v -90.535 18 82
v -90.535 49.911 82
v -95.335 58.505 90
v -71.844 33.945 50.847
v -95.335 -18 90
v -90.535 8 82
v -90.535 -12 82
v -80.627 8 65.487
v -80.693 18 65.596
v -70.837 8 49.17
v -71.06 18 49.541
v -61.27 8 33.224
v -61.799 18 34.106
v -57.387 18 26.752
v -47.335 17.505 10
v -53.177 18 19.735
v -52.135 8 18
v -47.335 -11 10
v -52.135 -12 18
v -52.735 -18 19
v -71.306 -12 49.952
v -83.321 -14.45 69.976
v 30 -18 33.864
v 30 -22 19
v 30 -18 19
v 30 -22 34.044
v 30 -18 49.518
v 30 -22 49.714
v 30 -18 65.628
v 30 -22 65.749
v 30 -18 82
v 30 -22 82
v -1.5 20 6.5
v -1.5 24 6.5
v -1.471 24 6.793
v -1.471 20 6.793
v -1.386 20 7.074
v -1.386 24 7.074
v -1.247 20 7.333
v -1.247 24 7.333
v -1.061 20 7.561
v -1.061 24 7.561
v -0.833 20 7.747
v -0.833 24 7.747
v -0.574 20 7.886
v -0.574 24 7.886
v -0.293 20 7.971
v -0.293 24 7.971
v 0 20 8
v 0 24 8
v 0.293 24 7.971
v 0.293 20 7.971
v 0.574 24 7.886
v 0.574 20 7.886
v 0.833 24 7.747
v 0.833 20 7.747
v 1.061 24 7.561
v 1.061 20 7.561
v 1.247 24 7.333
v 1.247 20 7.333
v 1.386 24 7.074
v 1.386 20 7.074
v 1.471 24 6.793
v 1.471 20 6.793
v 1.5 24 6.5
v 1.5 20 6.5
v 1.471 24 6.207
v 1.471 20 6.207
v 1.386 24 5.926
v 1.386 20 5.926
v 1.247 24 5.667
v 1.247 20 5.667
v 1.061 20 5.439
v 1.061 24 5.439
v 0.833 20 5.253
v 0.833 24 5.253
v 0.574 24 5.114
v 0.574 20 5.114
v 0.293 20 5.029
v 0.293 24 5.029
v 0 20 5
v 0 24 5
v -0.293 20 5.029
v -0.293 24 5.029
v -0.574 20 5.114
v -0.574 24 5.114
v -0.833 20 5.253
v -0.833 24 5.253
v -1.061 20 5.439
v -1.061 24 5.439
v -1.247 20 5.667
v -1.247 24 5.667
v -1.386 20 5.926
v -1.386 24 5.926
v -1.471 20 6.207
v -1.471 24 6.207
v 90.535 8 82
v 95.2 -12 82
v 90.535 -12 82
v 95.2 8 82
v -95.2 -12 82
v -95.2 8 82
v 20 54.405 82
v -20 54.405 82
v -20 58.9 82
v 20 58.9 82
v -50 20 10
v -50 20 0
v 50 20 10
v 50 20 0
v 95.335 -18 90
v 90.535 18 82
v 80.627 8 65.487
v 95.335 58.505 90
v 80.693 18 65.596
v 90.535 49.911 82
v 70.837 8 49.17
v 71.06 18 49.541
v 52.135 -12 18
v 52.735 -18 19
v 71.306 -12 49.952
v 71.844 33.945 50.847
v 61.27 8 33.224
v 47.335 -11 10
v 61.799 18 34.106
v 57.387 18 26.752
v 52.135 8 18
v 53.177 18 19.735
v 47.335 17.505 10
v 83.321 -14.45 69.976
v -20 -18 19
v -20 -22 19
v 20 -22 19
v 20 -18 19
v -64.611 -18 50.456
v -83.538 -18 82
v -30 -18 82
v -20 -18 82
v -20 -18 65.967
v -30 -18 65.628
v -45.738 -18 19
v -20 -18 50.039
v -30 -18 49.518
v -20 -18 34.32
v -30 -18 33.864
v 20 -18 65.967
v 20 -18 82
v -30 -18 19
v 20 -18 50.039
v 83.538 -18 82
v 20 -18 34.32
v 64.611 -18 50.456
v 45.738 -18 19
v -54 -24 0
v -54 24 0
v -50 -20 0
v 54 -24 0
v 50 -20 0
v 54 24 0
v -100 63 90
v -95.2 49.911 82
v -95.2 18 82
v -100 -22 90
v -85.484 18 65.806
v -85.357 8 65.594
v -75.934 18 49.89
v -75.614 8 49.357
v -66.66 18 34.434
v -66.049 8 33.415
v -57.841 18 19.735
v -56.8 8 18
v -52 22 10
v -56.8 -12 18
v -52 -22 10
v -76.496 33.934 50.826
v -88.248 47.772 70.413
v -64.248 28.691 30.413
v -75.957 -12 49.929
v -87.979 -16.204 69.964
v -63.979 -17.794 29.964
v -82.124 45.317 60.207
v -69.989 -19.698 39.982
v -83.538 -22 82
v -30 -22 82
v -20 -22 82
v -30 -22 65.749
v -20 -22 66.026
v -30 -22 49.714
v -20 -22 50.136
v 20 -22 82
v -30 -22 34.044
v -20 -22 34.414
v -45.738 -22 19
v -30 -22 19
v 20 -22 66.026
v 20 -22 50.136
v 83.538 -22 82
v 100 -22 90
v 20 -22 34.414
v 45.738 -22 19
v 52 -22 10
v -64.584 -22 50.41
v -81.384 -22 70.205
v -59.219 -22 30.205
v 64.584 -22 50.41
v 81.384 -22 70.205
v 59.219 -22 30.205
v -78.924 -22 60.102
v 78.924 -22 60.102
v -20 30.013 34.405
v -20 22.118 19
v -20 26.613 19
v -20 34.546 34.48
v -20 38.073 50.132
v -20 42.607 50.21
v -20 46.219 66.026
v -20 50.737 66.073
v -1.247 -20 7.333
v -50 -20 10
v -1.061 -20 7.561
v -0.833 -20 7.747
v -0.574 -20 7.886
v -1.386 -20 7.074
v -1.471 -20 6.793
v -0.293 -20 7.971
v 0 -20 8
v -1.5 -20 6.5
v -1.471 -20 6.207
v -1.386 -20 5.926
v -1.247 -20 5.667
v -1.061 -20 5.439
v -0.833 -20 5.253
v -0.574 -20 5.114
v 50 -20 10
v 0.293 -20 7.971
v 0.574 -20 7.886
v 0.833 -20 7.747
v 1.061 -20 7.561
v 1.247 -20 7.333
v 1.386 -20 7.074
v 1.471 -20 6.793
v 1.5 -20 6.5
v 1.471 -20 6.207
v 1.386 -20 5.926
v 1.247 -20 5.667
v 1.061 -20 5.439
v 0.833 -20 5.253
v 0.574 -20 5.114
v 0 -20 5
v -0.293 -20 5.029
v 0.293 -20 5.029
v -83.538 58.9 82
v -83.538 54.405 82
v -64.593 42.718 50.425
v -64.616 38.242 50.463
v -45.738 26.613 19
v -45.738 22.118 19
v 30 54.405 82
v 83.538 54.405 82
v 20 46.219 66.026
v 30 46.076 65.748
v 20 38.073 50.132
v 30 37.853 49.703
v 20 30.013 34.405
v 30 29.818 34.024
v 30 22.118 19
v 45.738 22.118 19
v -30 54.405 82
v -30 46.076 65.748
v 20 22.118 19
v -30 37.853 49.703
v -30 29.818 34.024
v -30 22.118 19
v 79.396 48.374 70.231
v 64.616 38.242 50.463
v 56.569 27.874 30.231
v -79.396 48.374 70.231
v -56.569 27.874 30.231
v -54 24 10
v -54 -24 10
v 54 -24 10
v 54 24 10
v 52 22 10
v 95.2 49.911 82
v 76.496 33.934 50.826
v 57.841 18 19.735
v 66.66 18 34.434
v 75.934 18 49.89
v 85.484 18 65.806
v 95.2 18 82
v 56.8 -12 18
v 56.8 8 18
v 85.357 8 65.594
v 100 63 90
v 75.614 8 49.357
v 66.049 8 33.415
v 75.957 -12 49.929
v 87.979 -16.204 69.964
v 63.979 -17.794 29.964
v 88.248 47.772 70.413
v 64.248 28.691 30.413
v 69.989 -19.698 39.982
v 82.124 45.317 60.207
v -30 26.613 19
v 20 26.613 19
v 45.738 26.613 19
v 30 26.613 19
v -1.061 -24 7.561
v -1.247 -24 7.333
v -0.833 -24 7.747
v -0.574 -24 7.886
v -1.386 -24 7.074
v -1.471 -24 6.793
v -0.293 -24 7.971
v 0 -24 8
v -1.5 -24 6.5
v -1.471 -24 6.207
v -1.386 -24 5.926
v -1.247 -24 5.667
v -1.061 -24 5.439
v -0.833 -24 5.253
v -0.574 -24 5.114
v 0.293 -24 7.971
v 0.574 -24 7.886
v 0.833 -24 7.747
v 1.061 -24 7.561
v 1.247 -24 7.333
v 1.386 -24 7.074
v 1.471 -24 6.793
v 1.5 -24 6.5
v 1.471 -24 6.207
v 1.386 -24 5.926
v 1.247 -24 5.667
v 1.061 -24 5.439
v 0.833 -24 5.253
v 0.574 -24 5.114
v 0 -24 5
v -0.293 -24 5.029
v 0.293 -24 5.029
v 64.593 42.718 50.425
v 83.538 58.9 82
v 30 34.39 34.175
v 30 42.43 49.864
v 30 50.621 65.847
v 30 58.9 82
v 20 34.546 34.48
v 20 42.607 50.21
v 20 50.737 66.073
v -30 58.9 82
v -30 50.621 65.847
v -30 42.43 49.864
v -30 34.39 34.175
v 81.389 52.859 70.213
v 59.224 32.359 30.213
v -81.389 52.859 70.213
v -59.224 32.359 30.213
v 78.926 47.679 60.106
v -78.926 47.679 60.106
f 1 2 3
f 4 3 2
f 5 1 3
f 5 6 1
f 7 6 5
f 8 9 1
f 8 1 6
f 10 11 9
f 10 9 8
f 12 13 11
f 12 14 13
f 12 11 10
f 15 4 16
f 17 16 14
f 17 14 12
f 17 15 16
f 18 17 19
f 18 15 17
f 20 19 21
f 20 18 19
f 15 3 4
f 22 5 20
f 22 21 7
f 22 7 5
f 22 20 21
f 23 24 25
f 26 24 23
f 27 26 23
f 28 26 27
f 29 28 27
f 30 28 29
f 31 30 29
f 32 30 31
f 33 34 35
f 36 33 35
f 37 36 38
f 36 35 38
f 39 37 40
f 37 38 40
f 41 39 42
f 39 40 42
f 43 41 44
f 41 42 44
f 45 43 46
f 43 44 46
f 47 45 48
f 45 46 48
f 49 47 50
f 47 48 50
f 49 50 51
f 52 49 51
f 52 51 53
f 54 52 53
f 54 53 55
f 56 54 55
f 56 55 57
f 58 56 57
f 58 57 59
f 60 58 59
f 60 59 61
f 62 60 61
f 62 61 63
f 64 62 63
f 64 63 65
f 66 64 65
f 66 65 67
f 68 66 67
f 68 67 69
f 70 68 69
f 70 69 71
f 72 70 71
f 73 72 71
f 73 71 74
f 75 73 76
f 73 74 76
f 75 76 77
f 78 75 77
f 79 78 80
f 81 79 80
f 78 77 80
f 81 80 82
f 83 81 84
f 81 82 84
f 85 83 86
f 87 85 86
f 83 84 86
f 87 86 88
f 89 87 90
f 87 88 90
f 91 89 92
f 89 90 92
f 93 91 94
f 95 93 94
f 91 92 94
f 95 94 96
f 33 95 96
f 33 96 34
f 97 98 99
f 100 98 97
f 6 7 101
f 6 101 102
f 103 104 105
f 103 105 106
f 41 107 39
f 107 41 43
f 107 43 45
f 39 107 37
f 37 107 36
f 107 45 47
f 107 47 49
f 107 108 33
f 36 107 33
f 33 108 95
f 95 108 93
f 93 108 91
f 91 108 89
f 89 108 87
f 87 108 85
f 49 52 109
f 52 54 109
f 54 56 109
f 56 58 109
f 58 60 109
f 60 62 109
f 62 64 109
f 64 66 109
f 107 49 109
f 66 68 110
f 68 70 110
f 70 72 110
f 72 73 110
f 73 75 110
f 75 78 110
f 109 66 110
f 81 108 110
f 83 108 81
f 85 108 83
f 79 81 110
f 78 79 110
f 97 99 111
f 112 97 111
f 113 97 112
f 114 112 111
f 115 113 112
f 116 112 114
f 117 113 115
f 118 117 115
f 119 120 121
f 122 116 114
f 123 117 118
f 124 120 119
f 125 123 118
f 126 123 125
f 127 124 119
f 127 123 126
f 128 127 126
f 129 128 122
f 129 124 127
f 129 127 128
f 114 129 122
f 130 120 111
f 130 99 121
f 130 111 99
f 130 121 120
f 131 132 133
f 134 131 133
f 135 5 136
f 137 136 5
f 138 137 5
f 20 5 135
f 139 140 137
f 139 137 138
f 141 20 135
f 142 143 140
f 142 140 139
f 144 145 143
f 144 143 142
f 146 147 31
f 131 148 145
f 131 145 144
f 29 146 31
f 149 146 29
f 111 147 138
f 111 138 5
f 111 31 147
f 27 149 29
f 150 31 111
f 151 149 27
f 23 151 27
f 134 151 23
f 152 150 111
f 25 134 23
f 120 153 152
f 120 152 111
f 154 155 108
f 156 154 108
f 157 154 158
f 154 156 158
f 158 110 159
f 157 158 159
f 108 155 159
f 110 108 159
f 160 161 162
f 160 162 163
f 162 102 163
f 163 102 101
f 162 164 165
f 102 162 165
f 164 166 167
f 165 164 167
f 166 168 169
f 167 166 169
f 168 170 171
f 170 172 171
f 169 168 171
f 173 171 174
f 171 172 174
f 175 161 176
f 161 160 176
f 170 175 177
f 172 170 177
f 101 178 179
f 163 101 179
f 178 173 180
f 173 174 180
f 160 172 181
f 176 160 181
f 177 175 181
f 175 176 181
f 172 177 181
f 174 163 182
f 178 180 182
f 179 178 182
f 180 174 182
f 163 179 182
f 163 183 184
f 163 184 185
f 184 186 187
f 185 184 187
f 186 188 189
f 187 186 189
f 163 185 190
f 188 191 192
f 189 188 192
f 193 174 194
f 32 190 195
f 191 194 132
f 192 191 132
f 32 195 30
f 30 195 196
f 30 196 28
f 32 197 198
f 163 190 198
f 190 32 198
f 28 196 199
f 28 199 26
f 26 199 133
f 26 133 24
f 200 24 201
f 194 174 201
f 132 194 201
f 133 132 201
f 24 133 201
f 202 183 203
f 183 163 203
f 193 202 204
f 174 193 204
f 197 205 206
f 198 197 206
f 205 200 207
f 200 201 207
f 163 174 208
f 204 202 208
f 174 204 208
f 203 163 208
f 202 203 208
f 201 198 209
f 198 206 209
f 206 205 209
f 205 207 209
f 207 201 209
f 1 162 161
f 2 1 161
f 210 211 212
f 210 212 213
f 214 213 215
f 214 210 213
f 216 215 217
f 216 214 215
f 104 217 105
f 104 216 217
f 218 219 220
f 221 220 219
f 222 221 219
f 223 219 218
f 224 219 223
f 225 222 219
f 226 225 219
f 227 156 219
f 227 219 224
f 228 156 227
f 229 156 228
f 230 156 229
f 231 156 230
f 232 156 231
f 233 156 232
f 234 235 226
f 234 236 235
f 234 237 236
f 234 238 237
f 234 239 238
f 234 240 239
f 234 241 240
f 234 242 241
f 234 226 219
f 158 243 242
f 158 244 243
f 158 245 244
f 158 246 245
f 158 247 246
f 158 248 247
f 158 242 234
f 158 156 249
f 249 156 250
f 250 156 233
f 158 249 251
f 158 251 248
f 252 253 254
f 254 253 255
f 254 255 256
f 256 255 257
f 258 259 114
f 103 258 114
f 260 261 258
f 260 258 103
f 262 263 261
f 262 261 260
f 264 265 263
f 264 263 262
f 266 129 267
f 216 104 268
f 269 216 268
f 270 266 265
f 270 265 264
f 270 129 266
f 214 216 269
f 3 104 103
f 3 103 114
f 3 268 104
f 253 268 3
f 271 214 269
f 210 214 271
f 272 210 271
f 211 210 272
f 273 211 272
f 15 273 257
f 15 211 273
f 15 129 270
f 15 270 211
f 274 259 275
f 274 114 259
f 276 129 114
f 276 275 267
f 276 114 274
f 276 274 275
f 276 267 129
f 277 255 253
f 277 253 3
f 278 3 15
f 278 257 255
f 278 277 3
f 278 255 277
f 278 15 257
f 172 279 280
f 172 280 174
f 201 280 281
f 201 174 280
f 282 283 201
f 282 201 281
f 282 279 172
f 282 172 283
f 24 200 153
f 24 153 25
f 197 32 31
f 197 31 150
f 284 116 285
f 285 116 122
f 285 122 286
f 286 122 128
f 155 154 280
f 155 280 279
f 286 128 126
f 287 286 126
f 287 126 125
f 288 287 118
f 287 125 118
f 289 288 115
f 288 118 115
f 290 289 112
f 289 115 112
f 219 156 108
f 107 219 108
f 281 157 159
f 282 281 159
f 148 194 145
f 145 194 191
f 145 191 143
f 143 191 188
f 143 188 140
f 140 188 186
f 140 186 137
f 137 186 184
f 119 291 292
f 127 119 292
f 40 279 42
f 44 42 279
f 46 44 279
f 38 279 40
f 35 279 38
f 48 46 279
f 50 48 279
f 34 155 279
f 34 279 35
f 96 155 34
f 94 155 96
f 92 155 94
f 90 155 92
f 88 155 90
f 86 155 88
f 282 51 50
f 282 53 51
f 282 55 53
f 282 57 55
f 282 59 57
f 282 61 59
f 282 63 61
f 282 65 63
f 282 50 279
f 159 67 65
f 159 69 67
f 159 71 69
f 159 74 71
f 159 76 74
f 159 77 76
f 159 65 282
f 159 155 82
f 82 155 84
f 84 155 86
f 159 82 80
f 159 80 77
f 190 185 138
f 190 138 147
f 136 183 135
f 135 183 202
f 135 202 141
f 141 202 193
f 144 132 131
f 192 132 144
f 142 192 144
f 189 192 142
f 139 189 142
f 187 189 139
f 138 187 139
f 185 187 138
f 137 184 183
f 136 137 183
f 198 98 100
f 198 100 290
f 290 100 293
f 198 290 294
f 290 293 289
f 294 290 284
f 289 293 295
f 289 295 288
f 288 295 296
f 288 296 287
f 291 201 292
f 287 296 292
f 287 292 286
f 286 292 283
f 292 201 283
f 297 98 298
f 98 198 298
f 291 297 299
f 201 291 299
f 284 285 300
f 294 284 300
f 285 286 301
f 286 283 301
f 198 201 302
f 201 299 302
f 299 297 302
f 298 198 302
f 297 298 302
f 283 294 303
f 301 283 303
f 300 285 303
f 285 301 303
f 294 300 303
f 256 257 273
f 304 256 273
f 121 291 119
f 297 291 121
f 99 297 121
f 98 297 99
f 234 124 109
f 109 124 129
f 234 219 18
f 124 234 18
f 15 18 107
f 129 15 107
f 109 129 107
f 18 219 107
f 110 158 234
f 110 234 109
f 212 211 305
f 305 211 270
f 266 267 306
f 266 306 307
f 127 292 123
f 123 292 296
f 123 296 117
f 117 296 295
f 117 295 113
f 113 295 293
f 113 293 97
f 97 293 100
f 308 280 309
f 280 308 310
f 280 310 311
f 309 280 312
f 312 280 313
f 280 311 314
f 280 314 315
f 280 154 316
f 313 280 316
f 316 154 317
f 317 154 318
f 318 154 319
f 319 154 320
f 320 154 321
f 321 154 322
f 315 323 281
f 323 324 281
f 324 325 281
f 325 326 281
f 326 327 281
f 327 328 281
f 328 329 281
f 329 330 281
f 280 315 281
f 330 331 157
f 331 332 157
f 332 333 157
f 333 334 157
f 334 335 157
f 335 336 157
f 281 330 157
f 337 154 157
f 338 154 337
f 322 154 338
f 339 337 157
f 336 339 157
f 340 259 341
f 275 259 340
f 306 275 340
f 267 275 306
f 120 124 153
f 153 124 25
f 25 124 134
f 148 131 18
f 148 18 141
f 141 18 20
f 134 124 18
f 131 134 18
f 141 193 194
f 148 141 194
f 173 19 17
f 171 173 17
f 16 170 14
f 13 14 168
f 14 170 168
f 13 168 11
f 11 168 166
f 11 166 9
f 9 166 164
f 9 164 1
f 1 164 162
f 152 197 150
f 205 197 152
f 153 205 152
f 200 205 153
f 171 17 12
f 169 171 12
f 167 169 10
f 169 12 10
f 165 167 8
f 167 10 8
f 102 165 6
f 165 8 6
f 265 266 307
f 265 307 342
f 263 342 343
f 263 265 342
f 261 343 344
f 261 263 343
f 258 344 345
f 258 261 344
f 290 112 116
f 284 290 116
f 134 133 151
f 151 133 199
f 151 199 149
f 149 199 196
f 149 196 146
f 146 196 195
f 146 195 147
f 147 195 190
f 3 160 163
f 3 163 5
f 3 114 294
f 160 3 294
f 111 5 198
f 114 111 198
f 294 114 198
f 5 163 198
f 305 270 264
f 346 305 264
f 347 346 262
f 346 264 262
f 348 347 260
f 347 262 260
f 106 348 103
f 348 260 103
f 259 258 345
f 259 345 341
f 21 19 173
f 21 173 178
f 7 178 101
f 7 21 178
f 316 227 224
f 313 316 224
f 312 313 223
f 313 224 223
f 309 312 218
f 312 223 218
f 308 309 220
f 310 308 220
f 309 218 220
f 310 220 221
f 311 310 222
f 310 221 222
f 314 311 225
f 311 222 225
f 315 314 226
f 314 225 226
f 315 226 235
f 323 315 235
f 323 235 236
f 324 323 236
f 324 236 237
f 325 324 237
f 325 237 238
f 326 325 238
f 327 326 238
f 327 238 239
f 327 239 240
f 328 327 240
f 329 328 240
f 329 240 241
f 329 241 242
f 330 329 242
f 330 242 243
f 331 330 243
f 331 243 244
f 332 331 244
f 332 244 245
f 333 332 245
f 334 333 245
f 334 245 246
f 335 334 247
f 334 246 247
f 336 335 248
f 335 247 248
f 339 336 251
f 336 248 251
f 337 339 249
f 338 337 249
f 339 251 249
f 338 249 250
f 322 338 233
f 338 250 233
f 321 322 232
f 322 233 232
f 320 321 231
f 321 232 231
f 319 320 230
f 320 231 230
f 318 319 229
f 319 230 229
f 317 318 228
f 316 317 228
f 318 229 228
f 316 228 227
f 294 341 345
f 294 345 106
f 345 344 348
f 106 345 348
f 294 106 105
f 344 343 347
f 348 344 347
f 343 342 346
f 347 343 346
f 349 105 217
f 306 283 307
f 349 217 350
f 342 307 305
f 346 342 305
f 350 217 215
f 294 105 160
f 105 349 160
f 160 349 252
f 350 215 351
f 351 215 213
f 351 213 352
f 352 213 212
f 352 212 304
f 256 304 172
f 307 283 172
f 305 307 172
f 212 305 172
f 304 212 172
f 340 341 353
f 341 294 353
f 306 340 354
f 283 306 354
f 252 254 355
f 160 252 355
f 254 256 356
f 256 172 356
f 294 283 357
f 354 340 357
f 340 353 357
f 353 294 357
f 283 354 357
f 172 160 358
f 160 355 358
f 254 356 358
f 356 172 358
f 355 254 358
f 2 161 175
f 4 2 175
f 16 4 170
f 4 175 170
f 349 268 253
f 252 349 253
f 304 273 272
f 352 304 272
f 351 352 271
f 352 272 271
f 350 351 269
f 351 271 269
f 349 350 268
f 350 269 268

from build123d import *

# Parameters (mm, degrees)
SKETCH_1_W          = 108
SKETCH_1_H          = 48
SKETCH_1_W_2        = 100
SKETCH_1_H_2        = 40
EXTRUDE_1_DEPTH     = 10
SKETCH_6_W          = 40
SKETCH_6_H          = 63
CUT_EXTRUDE_1_DEPTH = 102
SKETCH_7_W          = 64
SKETCH_7_H          = 20
CUT_EXTRUDE_2_DEPTH = 199
SKETCH_8_R          = 1.5
CUT_EXTRUDE_3_DEPTH = 139


with BuildPart() as part:
    # 草图1 → 凸台-拉伸1 (new body)
    with BuildSketch(Plane.XY):
        Rectangle(SKETCH_1_W, SKETCH_1_H)
        Rectangle(SKETCH_1_W_2, SKETCH_1_H_2, mode=Mode.SUBTRACT)
    extrude(amount=EXTRUDE_1_DEPTH)

    # 草图5 → 放样3 section 0
    with BuildSketch(Plane.XY.offset(90)):
        with BuildLine():
            Line((-100, -22), (100, -22))
            Line((100, -22), (100, 63))
            Line((100, 63), (-100, 63))
            Line((-100, 63), (-100, -22))
        make_face()
    # 草图2 → 放样3 section 1
    with BuildSketch(Plane.XY.offset(10)):
        with BuildLine():
            Line((52, 22), (-52, 22))
            Line((-52, 22), (-52, -22))
            Line((-52, -22), (52, -22))
            Line((52, -22), (52, 22))
        make_face()
    loft()

    # 抽壳2: read off the stored shape, not the designer's step
    # 抽壳2: loft between two sections, ruled curve by curve
    shell_2_from = [
        Edge.make_line((95.335238484, -18, 90), (95.335238484, 58.505280876, 90)),
        Edge.make_line((95.335238484, 58.505280876, 90), (-95.335238484, 58.505280876, 90)),
        Edge.make_line((-95.335238484, -18, 90), (95.335238484, -18, 90)),
        Edge.make_line((-95.335238484, 58.505280876, 90), (-95.335238484, -18, 90)),
    ]
    shell_2_to = [
        Edge.make_line((47.335238484, -18, 10), (47.335238484, 17.505280876, 10)),
        Edge.make_line((47.335238484, 17.505280876, 10), (-47.335238484, 17.505280876, 10)),
        Edge.make_line((-47.335238484, -18, 10), (47.335238484, -18, 10)),
        Edge.make_line((-47.335238484, 17.505280876, 10), (-47.335238484, -18, 10)),
    ]
    shell_2 = Solid(Shell([*[Face.make_surface_from_curves(shell_2_from[k], shell_2_to[k]) for k in range(4)], Face(Wire(shell_2_from)), Face(Wire(shell_2_to))]))
    add(shell_2, mode=Mode.SUBTRACT)

    # 草图6 → 切除-拉伸1 (cut)
    with BuildSketch(Plane.XZ.offset(24)):
        with Locations((0, 50.5)):
            Rectangle(SKETCH_6_W, SKETCH_6_H)
        Polygon((30, 19), (30, 82), (83.53809621, 82), (45.73809621, 19), align=None)
        Polygon((-45.73809621, 19), (-30, 19), (-30, 82), (-83.53809621, 82), align=None)
    extrude(amount=-CUT_EXTRUDE_1_DEPTH, mode=Mode.SUBTRACT)

    # 草图7 → 切除-拉伸2 (cut, symmetric)
    with BuildSketch(Plane.ZY.offset(54)):
        with Locations((50, -2)):
            Rectangle(SKETCH_7_W, SKETCH_7_H)
        Polygon((82, 49.910561753), (19.735489263, 18), (82, 18), align=None)
    extrude(amount=CUT_EXTRUDE_2_DEPTH, both=True, mode=Mode.SUBTRACT)

    # 草图8 → 切除-拉伸3 (cut)
    with BuildSketch(Plane(origin=(0, 24, 0), x_dir=(1, 0, 0), z_dir=(0, 1, 0))):
        with Locations(Location((0, -6.5, 0), (0, 0, 180))):
            Circle(SKETCH_8_R)
    extrude(amount=-CUT_EXTRUDE_3_DEPTH, mode=Mode.SUBTRACT)

    # 草图13 → 放样5 section 0
    with BuildSketch(Plane(origin=(30.393557709, 0, -18.236134625), x_dir=(0.5144957554275269, 0, 0.857492925712544), z_dir=(-0.857492925712544, 0, 0.5144957554275269))):
        with BuildLine():
            Line((32.928708539, -11), (43.42442195, -18))
            Line((43.42442195, -18), (32.928708539, -18))
            Line((32.928708539, -18), (32.928708539, -11))
        make_face()
    # 草图12 → 放样5 section 1
    with BuildSketch(Plane(origin=(-30.393557709, 0, -18.236134625), x_dir=(0.5144957554275263, 0, -0.8574929257125443), z_dir=(0.8574929257125443, 0, 0.5144957554275263))):
        with BuildLine():
            Line((-32.928708539, -11), (-43.42442195, -18))
            Line((-43.42442195, -18), (-32.928708539, -18))
            Line((-32.928708539, -18), (-32.928708539, -11))
        make_face()
    loft()


solid = part.part
